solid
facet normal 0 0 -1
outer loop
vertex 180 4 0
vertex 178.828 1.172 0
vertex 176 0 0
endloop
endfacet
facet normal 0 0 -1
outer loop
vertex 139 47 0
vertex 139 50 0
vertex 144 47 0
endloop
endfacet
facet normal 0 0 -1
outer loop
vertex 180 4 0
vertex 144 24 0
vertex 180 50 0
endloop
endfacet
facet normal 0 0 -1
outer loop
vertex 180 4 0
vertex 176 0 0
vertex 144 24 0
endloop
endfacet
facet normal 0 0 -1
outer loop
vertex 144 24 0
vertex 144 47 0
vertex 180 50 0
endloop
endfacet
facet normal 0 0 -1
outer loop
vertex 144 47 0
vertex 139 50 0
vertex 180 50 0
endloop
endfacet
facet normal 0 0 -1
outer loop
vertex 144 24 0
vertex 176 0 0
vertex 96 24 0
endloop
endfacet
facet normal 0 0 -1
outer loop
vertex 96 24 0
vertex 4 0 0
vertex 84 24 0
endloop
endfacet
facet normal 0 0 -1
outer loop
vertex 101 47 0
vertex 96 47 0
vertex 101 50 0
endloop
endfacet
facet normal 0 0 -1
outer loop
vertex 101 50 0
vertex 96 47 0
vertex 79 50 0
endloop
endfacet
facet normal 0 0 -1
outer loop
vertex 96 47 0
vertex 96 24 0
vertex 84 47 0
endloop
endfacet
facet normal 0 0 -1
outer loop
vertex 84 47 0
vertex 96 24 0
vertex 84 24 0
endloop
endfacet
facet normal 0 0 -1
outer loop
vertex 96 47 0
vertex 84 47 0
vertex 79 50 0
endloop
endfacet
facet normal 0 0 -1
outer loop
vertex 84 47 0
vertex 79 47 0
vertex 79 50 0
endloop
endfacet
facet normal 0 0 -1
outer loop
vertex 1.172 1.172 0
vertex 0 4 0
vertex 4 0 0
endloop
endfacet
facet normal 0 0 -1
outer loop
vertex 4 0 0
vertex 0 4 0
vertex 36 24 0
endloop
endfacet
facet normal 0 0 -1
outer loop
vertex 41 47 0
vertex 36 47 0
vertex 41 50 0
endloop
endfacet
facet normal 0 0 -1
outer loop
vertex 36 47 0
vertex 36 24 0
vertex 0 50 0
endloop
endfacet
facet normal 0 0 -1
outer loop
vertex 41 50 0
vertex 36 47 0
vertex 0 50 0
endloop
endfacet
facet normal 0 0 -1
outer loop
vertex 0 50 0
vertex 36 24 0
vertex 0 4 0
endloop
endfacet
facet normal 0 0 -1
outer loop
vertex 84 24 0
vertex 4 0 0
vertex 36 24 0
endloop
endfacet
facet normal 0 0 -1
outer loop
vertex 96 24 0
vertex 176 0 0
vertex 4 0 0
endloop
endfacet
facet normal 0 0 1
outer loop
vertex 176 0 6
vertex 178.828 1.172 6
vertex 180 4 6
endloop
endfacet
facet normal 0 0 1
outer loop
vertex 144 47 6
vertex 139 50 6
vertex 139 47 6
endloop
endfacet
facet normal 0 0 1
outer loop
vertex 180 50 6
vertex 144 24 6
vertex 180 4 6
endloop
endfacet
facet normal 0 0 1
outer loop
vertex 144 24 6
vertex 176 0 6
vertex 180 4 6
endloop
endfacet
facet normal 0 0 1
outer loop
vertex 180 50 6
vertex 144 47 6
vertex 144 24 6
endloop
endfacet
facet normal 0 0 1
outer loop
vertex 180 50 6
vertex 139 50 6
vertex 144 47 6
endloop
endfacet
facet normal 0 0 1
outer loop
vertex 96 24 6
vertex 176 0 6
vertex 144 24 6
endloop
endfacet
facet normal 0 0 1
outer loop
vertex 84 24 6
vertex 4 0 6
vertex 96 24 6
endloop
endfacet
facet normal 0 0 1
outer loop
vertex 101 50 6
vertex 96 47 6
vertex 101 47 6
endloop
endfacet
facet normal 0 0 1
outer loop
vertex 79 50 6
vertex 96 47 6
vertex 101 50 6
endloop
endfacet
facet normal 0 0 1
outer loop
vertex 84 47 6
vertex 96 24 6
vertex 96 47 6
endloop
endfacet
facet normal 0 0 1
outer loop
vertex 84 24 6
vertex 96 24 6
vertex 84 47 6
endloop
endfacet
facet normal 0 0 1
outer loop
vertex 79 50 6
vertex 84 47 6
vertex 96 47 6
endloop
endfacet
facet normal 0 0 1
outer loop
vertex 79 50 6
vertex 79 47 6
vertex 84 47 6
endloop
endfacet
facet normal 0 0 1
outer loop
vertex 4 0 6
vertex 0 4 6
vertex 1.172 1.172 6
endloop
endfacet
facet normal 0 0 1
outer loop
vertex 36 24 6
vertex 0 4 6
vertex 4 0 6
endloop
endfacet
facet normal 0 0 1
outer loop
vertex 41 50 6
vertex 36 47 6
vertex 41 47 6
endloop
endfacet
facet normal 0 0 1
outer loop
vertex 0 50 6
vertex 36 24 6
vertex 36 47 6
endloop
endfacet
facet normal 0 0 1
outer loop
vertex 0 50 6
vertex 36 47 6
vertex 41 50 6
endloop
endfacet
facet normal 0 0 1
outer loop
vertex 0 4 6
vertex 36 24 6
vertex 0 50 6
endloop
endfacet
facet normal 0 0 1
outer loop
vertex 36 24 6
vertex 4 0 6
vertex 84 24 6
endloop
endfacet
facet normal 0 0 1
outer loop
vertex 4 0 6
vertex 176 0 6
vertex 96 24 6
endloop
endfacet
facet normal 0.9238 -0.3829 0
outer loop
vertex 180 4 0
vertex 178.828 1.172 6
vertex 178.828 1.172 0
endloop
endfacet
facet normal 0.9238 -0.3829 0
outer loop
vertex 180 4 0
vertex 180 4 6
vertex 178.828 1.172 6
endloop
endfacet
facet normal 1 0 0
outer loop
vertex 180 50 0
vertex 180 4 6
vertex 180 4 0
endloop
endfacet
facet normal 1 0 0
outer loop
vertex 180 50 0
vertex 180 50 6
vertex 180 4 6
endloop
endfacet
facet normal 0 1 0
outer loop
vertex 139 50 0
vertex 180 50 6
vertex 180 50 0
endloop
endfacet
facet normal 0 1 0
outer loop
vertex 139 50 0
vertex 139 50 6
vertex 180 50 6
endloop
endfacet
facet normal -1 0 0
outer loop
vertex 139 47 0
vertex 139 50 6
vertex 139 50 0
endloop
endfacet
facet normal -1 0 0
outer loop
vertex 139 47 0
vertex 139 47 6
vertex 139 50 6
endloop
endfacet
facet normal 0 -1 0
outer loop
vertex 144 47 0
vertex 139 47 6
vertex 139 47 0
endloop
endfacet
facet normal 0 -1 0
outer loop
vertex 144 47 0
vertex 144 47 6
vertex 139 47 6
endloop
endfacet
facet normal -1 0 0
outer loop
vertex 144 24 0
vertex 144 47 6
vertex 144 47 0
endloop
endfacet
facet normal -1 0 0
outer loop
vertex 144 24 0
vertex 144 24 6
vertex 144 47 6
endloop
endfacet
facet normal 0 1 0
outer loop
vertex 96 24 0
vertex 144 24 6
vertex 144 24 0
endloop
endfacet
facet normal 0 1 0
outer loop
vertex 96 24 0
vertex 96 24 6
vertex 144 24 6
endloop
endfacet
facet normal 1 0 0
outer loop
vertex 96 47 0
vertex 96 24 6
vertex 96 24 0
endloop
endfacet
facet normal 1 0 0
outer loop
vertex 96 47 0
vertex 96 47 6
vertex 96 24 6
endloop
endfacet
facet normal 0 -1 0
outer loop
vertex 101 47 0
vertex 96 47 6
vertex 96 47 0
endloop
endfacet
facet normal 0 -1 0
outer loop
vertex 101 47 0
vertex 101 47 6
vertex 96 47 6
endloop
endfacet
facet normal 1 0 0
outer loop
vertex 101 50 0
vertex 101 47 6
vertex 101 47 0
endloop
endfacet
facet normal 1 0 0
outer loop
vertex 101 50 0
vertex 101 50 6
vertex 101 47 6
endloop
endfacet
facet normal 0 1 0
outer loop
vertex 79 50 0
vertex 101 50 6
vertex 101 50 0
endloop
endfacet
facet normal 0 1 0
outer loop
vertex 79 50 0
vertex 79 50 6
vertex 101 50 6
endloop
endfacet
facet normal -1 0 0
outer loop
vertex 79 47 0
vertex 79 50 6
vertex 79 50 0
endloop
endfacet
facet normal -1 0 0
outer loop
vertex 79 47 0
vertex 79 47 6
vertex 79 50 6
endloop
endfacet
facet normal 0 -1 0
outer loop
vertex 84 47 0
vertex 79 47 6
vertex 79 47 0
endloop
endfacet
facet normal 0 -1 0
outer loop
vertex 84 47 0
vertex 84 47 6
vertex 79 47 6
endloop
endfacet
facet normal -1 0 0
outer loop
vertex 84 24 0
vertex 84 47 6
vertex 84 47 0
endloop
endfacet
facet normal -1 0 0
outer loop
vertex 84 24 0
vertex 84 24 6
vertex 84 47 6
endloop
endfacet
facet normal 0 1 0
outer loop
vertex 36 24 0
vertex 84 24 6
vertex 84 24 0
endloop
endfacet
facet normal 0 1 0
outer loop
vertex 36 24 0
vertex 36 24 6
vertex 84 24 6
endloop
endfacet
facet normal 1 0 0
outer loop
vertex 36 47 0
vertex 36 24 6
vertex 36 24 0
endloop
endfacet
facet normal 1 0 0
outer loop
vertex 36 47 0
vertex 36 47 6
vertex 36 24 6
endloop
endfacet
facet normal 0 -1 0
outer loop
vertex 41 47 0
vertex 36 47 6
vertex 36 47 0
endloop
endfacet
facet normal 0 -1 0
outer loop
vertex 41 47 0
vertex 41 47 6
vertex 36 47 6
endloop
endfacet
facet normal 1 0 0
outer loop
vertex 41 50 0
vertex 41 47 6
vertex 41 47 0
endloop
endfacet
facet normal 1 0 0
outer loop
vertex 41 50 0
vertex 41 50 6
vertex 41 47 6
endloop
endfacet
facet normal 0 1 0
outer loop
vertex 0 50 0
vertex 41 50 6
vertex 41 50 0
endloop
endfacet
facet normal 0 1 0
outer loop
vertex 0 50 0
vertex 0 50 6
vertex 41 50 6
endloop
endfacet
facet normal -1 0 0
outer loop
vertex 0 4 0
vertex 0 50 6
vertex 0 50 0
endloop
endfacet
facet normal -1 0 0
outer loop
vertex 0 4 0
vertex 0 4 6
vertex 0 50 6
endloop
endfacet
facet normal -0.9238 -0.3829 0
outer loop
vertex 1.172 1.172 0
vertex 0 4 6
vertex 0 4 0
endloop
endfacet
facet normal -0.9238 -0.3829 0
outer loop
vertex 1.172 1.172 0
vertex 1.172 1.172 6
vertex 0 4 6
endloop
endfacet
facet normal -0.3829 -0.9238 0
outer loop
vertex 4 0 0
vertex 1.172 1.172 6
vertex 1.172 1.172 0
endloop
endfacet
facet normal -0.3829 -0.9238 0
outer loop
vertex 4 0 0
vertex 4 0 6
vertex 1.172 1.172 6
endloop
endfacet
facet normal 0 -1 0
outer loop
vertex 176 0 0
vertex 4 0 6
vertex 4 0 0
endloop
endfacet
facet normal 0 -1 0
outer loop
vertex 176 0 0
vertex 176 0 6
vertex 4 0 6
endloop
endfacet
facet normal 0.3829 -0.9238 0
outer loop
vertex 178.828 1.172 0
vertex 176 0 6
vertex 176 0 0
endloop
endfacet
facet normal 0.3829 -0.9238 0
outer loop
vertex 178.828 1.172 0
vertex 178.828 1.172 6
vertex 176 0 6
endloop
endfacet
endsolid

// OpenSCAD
$fn = 32;

// ----------------------------------------------------------------------
// Oversize slot bar: 180 mm bar with 2 oversize windows
// ----------------------------------------------------------------------

// --- parameters (mm) ---
profile_height = 6;       // extrusion height
profile_points = 24;      // points of the closed outline

profile = [[0, 4], [1.172, 1.172], [4, 0], [176, 0], [178.828, 1.172], [180, 4], [180, 50], [139, 50], [139, 47], [144, 47], [144, 24], [96, 24], [96, 47], [101, 47], [101, 50], [79, 50], [79, 47], [84, 47], [84, 24], [36, 24], [36, 47], [41, 47], [41, 50], [0, 50]];  // single closed polygon, 24 points, counter clockwise

// --- the one profile operation ---
linear_extrude(height = profile_height) polygon(points = profile);
